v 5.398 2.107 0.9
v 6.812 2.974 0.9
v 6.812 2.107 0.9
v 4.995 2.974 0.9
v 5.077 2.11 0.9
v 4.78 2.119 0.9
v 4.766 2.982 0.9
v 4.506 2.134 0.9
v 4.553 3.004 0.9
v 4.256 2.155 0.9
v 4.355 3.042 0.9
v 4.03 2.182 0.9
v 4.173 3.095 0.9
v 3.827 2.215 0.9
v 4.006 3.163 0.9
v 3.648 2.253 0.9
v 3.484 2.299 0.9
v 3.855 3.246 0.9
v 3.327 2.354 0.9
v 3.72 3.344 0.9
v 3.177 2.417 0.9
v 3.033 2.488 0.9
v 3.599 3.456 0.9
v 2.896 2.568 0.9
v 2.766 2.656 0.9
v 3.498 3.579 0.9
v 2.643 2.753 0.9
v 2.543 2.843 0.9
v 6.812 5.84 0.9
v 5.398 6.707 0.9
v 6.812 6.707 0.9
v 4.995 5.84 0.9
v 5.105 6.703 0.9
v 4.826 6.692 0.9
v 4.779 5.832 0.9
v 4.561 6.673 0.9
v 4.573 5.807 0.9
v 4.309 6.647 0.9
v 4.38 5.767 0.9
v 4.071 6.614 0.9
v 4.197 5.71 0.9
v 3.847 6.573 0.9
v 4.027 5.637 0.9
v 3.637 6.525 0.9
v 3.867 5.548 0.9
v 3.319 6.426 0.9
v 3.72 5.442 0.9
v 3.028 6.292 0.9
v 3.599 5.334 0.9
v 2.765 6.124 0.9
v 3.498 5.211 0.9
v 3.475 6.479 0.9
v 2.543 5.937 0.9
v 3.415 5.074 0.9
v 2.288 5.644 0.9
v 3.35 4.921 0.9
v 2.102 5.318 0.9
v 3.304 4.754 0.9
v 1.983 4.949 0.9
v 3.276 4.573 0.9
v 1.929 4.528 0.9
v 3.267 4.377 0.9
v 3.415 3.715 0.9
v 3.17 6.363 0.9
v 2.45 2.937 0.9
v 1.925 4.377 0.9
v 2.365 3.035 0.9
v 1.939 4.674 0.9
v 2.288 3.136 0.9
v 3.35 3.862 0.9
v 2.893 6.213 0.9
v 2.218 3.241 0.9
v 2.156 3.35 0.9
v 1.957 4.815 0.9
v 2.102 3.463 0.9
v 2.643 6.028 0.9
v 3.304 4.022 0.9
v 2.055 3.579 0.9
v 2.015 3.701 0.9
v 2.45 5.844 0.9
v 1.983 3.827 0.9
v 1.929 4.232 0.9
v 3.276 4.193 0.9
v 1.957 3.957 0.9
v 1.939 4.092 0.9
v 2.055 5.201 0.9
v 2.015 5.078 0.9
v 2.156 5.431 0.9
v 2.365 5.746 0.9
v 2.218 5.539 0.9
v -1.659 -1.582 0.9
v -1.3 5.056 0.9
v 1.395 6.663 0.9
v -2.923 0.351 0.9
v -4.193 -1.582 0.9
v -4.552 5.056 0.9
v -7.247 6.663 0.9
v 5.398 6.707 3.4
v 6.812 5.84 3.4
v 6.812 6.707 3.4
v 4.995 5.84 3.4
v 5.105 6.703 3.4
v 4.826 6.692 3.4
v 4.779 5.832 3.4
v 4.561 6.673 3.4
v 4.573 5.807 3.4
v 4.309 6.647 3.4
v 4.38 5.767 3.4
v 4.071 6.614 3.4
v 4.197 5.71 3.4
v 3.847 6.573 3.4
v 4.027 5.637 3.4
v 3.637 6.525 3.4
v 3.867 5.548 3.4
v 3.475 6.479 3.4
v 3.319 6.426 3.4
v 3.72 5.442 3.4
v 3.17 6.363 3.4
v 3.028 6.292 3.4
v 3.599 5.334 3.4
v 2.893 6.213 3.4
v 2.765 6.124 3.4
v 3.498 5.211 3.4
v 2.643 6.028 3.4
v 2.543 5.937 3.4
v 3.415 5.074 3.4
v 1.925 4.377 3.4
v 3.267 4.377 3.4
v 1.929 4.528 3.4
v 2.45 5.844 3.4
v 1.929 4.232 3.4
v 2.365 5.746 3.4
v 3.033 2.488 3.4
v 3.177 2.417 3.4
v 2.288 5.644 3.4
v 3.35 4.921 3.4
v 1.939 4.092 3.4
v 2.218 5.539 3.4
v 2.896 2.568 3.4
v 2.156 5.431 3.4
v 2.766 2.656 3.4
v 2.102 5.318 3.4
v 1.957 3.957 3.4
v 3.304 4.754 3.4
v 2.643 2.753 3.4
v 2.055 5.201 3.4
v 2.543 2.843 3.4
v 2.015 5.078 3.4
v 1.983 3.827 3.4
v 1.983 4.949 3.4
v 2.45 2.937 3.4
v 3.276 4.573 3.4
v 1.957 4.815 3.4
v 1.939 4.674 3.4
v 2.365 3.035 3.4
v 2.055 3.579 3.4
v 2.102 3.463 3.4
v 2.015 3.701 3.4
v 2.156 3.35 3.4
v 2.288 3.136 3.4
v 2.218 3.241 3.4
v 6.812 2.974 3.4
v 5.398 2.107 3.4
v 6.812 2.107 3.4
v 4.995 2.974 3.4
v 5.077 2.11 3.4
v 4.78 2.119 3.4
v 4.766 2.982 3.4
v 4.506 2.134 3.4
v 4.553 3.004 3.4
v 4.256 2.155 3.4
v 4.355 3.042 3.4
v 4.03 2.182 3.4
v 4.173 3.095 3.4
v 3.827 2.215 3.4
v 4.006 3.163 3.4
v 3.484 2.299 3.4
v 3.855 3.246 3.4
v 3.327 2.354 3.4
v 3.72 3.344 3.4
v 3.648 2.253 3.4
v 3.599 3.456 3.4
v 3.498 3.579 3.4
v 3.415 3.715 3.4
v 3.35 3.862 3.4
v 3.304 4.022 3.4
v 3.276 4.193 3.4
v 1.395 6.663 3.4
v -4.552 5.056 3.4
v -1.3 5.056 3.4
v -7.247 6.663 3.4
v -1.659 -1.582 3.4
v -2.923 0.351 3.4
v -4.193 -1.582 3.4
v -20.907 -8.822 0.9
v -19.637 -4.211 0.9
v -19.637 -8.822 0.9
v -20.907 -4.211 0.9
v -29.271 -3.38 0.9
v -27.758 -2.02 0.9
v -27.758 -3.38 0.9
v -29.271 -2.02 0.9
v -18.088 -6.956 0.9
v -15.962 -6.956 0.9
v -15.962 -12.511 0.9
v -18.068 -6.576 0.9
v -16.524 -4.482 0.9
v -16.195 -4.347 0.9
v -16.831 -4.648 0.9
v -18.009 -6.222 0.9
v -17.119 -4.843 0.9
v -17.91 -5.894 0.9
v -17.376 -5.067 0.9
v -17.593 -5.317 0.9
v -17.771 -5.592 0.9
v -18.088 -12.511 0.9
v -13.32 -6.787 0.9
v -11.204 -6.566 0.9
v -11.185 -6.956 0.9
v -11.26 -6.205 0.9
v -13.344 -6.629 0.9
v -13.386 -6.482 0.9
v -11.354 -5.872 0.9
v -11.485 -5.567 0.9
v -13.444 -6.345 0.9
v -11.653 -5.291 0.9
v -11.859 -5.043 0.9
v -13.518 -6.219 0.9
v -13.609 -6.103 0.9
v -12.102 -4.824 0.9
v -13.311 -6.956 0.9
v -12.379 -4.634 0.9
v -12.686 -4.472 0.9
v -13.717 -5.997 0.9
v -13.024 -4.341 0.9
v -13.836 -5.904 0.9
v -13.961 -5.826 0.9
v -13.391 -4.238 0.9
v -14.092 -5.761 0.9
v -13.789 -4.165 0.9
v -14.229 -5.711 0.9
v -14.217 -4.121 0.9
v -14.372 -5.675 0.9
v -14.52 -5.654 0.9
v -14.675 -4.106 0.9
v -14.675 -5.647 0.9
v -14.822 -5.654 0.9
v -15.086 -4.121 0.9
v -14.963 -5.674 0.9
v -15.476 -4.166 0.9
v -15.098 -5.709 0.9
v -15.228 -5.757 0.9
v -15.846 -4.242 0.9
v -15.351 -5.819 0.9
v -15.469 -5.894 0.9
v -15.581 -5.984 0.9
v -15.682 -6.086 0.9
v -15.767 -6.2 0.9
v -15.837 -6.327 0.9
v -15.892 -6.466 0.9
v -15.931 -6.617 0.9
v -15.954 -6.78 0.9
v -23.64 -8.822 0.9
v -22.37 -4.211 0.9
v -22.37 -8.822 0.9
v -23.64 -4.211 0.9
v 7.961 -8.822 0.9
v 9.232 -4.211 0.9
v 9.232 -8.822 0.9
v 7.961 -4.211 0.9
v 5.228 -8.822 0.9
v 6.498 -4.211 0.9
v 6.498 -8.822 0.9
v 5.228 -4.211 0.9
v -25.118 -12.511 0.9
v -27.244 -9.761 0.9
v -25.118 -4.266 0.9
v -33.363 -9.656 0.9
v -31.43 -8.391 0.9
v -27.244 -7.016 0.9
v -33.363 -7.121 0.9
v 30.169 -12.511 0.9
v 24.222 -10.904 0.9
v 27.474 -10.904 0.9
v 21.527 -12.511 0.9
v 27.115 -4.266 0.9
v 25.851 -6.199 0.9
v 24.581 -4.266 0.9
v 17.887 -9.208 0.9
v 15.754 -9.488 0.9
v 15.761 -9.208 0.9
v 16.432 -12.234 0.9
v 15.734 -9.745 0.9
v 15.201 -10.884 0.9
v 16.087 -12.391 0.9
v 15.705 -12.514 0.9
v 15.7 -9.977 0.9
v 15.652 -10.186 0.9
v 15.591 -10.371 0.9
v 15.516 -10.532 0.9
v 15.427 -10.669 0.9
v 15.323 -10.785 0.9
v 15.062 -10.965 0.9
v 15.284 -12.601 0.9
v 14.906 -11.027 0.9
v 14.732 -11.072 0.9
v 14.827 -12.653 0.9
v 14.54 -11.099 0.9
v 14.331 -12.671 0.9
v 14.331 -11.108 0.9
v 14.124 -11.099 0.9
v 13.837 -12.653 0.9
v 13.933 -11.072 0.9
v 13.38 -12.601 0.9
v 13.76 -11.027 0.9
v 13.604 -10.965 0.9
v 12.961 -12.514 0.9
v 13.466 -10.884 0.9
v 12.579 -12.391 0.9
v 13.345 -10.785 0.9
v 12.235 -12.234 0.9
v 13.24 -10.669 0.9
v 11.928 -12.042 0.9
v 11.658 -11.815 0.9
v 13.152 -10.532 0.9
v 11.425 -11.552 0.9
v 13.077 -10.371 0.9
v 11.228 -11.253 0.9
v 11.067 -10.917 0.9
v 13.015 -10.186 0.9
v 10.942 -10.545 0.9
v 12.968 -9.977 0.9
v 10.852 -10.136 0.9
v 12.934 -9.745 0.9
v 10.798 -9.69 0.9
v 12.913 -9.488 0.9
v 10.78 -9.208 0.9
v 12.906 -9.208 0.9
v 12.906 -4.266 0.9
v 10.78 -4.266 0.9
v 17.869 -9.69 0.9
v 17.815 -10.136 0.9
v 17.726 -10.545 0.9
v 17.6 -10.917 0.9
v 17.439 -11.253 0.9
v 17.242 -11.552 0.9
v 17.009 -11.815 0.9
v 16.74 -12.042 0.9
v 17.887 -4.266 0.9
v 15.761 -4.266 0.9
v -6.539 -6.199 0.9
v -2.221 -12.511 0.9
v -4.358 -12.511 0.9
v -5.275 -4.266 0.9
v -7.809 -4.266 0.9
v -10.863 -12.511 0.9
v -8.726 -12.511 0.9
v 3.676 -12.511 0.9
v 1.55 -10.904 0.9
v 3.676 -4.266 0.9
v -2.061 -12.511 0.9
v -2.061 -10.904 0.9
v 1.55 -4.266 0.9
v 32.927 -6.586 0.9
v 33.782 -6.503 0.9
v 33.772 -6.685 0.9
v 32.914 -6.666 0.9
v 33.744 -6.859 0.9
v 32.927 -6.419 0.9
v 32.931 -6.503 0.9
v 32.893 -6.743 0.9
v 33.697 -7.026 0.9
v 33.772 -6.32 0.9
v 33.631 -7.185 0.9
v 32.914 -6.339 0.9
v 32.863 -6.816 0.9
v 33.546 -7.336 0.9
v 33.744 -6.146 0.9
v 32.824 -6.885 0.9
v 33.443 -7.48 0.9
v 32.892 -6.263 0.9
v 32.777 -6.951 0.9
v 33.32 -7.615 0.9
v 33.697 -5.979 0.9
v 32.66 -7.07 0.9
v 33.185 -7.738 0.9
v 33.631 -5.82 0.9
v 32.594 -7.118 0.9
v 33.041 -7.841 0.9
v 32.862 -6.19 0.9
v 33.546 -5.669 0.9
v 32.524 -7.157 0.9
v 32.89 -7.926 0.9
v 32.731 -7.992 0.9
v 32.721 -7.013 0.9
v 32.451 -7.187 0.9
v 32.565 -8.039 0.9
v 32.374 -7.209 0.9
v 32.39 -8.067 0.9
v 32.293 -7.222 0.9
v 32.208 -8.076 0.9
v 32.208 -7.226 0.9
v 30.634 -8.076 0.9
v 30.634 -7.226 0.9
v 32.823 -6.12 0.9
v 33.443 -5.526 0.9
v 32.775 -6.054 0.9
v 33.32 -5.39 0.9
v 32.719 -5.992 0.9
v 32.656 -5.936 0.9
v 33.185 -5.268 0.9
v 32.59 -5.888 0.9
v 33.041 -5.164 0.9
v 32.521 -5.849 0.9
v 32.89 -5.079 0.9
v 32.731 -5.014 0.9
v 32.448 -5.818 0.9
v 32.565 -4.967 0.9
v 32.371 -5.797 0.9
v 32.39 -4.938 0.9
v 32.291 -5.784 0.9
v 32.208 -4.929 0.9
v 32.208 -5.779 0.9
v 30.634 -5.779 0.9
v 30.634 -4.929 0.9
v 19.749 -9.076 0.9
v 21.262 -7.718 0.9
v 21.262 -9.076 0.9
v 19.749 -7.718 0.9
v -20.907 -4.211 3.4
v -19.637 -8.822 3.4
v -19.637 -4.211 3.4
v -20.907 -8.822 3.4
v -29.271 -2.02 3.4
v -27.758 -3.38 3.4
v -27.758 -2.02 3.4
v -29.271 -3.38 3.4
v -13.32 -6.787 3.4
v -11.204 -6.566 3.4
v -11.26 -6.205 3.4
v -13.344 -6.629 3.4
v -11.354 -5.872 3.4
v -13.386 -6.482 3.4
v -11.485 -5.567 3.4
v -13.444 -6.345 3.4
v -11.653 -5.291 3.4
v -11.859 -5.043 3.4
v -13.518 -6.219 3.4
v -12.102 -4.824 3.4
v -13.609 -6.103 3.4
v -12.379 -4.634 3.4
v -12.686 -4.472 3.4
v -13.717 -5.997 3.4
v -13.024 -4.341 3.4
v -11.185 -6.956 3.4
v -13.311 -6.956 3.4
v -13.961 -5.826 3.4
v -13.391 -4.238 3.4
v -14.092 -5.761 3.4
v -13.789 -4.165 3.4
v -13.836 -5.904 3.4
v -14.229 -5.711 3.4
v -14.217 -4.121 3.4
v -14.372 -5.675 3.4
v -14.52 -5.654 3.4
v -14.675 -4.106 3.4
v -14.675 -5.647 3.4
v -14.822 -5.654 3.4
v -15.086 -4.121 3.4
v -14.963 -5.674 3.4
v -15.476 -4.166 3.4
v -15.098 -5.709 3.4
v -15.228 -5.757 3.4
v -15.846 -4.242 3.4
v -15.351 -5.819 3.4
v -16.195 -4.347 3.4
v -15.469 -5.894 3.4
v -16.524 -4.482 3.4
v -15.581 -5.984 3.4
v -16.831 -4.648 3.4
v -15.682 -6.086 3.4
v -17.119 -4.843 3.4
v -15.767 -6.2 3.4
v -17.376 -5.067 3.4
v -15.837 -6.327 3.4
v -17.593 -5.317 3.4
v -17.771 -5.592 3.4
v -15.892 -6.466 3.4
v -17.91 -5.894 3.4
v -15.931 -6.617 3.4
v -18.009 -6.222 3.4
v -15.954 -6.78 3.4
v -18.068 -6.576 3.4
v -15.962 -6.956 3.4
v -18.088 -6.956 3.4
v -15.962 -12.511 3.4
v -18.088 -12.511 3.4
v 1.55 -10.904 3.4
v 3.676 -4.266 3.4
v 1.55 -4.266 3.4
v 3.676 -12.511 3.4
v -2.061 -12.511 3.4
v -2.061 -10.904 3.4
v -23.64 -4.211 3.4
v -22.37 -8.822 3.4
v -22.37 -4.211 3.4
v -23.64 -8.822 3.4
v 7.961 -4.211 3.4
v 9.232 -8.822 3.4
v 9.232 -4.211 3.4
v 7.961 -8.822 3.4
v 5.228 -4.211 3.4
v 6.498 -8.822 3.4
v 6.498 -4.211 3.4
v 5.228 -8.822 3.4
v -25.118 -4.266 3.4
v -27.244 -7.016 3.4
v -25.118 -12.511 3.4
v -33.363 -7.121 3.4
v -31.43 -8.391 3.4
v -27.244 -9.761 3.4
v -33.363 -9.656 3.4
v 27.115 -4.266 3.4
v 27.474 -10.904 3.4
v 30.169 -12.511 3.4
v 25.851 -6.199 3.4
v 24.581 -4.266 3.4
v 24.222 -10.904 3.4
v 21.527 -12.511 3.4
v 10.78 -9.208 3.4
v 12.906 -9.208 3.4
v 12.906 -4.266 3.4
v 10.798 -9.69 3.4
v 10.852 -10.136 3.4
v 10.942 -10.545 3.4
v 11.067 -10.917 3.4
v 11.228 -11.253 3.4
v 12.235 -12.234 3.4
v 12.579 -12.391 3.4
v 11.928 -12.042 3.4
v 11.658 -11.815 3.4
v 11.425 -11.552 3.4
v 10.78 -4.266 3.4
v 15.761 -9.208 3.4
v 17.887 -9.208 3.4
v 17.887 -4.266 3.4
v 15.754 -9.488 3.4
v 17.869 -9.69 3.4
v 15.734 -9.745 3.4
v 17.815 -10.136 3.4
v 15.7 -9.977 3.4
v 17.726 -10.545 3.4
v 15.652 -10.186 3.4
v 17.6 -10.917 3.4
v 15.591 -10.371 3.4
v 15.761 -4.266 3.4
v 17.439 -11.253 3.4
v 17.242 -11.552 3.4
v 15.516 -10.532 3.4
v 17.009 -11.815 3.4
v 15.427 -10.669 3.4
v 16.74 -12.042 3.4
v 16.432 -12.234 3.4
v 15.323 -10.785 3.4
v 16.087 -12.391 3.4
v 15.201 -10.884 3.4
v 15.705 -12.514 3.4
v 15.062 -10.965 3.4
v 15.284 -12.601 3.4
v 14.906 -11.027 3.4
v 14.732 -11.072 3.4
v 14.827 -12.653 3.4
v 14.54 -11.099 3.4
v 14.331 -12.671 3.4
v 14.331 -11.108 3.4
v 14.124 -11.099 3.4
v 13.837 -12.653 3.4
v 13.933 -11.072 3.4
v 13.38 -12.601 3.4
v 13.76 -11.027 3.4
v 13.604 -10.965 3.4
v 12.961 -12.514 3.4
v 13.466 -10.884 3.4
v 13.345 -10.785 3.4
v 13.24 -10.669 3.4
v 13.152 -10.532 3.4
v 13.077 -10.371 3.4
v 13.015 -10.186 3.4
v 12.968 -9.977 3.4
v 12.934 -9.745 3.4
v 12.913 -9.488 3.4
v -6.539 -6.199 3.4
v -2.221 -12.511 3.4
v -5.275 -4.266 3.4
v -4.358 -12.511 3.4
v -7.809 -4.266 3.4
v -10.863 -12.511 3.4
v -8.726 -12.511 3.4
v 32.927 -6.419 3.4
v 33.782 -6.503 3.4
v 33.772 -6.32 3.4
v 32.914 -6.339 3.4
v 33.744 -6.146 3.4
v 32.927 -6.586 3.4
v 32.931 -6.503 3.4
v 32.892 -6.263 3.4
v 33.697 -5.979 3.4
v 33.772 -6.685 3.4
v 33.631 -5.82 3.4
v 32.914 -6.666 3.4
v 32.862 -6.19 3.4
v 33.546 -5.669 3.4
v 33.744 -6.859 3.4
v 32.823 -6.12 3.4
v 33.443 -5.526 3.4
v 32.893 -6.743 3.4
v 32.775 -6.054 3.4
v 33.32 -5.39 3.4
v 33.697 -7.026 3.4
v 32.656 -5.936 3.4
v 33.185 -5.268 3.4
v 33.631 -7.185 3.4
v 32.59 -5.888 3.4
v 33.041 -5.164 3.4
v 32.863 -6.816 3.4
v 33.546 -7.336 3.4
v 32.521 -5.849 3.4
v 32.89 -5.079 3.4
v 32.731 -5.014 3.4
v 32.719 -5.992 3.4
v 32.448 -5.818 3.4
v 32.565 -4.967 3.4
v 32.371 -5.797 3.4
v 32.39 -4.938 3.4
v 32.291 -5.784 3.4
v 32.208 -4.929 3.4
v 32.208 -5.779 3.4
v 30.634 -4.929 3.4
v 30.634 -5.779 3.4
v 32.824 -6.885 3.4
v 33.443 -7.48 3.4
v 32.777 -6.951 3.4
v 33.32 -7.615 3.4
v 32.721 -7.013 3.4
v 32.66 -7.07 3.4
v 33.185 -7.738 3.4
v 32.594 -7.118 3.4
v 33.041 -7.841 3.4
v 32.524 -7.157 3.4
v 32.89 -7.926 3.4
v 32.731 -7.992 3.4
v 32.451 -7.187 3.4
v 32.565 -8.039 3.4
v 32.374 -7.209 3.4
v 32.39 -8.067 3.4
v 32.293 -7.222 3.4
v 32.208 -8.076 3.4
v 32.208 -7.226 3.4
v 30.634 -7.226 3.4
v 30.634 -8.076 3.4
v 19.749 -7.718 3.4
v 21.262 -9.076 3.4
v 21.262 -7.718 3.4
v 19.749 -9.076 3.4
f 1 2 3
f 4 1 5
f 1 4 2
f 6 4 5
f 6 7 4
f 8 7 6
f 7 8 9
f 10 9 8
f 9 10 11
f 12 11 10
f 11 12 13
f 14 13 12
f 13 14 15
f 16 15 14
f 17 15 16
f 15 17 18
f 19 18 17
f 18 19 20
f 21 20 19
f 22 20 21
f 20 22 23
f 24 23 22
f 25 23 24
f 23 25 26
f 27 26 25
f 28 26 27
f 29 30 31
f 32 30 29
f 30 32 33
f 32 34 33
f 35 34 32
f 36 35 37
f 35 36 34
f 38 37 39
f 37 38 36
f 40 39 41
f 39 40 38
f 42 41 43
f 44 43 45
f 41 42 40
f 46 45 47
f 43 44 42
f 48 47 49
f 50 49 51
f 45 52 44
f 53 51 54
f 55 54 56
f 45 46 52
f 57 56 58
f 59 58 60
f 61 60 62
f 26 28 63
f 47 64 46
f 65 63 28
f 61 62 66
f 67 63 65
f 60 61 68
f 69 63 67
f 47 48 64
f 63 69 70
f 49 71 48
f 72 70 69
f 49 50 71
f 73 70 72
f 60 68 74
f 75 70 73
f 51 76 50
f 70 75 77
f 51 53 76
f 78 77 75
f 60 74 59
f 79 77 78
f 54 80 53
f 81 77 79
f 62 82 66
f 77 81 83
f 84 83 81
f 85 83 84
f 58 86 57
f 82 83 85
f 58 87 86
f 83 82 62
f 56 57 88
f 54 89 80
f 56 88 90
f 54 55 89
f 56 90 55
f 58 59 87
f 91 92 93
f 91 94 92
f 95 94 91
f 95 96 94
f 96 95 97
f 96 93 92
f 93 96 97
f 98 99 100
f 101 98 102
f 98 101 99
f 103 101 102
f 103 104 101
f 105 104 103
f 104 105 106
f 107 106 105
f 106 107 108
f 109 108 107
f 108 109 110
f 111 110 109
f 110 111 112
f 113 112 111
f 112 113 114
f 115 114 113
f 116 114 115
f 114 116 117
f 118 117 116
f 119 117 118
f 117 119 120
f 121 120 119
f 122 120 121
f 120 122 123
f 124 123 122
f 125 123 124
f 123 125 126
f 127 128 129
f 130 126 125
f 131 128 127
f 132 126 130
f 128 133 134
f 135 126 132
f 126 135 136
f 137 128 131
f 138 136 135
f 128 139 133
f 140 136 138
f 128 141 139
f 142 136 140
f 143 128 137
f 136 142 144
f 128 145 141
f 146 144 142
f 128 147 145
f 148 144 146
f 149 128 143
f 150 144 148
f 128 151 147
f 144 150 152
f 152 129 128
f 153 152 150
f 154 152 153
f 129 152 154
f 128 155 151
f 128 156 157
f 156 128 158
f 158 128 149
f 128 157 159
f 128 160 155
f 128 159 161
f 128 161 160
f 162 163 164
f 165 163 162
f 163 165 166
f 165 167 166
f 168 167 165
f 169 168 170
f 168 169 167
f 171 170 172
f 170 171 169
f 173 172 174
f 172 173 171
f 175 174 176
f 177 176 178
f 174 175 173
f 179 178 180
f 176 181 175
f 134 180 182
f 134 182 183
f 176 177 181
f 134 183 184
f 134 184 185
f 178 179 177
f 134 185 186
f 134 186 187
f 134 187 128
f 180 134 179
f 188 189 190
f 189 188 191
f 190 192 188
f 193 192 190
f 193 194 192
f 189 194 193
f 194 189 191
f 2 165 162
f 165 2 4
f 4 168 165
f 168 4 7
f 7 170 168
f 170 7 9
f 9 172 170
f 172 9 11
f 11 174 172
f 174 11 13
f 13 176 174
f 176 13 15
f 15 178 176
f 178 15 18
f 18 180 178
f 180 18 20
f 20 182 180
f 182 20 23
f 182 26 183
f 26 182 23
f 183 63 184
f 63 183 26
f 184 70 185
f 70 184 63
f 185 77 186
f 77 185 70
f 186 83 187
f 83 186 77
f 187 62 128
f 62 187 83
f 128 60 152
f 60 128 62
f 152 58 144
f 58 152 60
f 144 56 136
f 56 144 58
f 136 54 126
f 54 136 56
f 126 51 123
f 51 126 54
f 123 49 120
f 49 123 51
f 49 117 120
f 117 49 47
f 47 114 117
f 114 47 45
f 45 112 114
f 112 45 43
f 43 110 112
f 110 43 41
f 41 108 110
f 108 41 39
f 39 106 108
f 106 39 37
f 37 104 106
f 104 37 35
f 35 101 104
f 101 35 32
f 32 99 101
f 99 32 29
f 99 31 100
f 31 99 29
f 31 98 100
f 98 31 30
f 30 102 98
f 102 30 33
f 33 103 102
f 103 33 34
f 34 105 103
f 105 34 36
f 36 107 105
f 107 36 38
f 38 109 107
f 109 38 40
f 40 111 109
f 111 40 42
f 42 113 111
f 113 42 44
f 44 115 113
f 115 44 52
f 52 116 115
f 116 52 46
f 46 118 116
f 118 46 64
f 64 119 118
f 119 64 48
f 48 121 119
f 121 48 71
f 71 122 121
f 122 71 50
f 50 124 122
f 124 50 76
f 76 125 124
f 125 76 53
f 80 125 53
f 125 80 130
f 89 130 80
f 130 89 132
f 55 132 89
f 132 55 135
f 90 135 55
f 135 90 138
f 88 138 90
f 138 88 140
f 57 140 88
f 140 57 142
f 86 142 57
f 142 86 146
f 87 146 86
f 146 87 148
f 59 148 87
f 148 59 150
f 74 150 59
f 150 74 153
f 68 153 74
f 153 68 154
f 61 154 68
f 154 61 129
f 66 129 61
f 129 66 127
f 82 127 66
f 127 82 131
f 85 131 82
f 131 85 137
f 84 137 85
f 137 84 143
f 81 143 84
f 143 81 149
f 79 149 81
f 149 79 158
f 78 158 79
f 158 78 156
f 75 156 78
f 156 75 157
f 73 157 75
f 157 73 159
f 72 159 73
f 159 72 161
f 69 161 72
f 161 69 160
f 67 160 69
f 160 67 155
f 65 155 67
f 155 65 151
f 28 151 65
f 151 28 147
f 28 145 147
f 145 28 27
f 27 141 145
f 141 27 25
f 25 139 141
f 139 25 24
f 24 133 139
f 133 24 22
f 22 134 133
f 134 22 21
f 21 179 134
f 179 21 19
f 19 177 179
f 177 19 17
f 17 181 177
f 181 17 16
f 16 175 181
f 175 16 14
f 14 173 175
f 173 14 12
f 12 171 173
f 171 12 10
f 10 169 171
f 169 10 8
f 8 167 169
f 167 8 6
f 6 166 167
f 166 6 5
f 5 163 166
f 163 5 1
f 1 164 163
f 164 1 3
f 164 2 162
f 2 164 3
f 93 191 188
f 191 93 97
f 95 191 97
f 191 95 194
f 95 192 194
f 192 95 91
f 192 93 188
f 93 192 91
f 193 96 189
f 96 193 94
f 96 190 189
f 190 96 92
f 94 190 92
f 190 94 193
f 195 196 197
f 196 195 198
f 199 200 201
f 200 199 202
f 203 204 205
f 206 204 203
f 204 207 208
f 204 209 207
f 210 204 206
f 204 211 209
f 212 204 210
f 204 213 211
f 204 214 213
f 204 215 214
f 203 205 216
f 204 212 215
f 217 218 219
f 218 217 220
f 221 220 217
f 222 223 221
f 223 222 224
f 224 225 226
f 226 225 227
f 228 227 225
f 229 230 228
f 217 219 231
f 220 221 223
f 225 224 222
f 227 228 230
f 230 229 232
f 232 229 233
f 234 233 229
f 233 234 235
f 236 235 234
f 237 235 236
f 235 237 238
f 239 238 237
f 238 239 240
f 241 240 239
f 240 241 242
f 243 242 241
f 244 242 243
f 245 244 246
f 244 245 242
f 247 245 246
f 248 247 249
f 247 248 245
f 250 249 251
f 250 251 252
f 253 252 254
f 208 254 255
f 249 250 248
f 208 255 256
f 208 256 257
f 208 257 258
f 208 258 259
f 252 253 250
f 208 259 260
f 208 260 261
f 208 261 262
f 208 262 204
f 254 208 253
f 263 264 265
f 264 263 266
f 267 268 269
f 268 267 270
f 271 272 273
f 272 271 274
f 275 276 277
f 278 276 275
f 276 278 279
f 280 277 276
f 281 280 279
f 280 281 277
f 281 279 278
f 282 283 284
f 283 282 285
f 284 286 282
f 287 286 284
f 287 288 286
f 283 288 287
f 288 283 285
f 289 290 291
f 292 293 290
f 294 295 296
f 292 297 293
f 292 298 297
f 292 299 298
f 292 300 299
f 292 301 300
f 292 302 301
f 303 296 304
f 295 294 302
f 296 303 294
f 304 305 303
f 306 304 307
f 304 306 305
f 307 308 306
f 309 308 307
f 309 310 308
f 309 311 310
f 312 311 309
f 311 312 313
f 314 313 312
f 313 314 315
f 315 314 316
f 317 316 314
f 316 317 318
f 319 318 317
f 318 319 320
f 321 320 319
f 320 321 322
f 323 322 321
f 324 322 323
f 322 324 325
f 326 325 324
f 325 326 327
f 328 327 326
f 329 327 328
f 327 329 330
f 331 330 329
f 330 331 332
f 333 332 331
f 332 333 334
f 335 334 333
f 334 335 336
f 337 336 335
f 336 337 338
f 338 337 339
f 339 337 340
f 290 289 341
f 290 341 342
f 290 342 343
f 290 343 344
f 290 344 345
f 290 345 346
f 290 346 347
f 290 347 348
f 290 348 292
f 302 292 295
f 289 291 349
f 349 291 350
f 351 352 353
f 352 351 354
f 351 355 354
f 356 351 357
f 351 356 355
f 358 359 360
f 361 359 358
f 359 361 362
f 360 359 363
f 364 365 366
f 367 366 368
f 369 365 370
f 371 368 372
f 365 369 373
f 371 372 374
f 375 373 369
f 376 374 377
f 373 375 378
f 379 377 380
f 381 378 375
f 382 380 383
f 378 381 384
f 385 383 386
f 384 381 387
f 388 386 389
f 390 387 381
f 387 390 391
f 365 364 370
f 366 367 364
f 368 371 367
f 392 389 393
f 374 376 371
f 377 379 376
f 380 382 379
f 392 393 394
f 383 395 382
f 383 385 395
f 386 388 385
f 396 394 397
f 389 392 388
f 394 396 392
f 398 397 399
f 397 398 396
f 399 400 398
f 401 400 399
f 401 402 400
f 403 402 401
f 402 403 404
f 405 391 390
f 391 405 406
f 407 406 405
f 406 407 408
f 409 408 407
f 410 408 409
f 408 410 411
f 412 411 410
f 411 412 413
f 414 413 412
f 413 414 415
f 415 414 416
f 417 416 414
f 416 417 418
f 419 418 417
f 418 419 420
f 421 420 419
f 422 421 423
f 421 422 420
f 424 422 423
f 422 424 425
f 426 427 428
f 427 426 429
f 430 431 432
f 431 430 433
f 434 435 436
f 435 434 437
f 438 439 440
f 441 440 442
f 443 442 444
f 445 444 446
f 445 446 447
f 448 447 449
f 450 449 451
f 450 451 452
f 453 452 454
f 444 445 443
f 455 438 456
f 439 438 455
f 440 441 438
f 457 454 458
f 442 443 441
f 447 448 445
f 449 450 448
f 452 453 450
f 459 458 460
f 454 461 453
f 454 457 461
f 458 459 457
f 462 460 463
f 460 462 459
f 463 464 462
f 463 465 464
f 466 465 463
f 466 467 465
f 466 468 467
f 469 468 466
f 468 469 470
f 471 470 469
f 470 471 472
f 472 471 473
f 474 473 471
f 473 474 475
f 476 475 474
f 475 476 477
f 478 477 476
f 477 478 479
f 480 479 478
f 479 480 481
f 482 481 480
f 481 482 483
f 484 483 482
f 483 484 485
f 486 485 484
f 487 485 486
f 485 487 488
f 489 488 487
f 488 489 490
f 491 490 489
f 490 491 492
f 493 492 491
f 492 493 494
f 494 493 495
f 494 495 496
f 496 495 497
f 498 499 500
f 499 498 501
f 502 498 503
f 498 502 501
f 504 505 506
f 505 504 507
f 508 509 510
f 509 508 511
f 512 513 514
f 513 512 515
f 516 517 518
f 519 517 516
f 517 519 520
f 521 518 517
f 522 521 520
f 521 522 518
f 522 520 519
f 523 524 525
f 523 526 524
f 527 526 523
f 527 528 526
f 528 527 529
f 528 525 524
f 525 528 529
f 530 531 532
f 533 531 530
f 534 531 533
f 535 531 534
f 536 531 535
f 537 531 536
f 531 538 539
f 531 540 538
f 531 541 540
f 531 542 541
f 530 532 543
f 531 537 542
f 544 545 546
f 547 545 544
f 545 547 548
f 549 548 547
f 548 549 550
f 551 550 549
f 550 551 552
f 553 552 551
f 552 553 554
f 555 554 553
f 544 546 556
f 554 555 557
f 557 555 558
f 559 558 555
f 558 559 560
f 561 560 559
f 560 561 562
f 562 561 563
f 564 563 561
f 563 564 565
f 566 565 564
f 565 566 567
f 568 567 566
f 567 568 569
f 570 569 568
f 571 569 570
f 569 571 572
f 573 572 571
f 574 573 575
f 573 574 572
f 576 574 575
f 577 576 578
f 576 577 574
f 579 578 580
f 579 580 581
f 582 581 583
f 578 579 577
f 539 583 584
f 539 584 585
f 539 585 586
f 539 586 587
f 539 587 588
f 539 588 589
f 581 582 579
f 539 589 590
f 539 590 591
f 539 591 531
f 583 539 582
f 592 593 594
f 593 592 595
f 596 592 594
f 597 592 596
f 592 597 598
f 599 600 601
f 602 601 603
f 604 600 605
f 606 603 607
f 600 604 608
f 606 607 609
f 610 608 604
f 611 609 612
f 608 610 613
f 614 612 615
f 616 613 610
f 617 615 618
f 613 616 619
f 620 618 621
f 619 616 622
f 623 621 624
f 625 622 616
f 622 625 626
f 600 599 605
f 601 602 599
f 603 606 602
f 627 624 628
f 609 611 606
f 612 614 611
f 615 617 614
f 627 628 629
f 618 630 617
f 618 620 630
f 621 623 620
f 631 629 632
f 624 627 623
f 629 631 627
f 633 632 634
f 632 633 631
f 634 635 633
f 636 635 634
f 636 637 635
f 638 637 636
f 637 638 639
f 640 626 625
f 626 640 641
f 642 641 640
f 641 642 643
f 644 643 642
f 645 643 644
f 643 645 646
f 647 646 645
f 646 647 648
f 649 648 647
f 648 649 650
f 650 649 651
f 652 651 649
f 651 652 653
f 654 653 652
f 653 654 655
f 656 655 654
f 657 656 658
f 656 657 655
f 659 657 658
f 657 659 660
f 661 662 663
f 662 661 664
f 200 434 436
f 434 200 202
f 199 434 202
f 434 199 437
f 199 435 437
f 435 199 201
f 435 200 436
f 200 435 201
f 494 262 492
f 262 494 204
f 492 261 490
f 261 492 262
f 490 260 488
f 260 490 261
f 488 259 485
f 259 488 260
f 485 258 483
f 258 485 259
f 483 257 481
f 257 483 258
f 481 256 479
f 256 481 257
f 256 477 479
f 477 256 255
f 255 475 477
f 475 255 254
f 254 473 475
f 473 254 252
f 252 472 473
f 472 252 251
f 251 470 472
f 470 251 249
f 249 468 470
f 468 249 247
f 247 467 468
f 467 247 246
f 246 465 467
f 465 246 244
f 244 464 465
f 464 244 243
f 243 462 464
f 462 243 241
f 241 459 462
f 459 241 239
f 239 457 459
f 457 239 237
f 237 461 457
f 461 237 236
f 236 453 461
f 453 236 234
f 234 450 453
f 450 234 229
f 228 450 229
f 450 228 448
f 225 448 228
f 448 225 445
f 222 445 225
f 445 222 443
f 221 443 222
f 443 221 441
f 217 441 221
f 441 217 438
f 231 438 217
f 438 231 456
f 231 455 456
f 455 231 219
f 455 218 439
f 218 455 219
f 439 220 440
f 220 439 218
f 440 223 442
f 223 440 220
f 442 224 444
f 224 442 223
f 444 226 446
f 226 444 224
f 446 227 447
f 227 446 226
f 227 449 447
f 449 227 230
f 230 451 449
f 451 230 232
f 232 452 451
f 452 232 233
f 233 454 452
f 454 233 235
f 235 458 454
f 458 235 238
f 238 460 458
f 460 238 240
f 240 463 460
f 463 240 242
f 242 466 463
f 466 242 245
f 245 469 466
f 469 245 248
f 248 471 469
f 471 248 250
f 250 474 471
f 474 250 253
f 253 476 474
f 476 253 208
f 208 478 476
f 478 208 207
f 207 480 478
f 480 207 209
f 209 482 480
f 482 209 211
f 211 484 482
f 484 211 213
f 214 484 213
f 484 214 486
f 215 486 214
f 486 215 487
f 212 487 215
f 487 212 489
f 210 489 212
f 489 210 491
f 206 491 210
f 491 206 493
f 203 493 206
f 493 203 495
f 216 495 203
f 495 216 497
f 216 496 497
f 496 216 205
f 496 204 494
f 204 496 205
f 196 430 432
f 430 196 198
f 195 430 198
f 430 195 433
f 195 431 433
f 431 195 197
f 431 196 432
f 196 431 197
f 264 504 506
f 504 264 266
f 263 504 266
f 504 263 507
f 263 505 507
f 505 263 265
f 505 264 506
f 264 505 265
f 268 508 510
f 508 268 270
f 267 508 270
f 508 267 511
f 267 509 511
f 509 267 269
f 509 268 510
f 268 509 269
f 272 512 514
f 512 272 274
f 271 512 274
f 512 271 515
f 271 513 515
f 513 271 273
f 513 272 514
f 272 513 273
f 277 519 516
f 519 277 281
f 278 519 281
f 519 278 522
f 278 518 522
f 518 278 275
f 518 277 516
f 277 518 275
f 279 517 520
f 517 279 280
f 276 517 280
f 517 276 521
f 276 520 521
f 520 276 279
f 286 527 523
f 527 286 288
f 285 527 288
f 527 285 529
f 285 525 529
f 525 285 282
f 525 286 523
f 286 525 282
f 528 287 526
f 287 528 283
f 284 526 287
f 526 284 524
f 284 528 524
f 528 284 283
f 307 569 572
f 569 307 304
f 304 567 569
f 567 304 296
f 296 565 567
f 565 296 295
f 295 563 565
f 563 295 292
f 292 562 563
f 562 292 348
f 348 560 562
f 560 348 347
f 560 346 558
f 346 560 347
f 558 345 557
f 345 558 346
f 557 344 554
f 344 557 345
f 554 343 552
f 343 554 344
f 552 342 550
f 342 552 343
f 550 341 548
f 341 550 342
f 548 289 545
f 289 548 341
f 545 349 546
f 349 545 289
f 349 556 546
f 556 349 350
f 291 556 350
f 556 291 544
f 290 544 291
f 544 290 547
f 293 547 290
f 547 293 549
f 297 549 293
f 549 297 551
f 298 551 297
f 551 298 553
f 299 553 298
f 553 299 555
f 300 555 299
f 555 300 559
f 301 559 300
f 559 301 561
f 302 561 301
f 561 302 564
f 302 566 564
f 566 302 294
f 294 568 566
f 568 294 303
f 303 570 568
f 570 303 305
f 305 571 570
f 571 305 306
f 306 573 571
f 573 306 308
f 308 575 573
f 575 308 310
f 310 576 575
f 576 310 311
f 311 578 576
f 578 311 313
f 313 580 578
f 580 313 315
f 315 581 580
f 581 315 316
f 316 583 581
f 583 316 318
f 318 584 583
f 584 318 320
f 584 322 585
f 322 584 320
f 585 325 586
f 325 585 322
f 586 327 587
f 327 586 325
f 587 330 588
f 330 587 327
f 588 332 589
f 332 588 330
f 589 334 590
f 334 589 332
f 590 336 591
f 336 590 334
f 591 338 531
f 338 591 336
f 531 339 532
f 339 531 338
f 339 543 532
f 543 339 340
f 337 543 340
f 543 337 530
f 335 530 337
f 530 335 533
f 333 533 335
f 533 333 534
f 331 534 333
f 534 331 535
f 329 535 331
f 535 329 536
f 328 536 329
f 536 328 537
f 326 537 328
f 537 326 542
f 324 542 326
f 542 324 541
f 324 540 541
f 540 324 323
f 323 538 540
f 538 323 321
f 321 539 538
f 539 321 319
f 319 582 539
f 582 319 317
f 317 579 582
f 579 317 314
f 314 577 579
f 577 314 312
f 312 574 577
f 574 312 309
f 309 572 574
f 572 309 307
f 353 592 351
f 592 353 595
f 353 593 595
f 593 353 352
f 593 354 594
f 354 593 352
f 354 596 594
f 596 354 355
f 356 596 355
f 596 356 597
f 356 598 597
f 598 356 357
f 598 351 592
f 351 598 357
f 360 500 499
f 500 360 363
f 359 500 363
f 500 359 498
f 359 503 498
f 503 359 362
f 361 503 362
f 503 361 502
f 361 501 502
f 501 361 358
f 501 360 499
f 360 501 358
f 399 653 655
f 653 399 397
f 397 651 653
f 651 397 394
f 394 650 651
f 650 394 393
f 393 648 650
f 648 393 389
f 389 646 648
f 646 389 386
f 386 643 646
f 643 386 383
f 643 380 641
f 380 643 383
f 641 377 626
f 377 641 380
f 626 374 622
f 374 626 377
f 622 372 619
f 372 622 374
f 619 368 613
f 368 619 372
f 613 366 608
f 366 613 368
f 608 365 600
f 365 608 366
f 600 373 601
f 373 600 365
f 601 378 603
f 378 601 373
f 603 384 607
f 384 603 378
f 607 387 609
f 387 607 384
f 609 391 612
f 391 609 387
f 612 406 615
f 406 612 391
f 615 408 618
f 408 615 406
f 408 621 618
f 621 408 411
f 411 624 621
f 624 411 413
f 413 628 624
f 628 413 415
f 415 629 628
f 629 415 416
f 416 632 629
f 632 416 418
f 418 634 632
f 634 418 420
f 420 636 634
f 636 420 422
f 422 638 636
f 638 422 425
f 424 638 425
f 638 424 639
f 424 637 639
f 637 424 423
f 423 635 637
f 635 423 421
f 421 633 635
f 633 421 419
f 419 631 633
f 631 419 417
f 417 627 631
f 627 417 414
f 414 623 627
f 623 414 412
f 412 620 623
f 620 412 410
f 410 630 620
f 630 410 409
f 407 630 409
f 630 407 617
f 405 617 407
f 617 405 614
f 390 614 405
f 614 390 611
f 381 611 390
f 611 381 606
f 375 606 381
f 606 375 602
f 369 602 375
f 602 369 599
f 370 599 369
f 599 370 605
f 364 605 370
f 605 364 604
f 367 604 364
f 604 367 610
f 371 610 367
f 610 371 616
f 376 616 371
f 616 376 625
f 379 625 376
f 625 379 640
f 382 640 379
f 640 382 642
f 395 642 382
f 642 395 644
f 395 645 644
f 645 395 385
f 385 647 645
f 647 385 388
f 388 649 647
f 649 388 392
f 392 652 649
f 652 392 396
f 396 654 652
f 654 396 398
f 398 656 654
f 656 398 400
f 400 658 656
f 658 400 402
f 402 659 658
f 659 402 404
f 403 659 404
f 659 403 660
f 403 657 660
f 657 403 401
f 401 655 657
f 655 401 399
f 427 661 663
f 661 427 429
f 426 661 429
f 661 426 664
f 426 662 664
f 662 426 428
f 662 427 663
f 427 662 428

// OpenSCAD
$fn = 48;
  // syllabics (overlaid on icon, tallest)
  translate([0, 2.467, 0.900]) linear_extrude(height=2.500) text("ᐁᒼ", size=8.143, halign="center", valign="center", font="Euphemia UCAS:style=Bold");
  translate([0, -7.467, 0.900]) linear_extrude(height=2.500) text("ᐋᐦᒋᐱᒧᐦᑌᐎᐣ", size=8.143, halign="center", valign="center", font="Euphemia UCAS:style=Bold");
